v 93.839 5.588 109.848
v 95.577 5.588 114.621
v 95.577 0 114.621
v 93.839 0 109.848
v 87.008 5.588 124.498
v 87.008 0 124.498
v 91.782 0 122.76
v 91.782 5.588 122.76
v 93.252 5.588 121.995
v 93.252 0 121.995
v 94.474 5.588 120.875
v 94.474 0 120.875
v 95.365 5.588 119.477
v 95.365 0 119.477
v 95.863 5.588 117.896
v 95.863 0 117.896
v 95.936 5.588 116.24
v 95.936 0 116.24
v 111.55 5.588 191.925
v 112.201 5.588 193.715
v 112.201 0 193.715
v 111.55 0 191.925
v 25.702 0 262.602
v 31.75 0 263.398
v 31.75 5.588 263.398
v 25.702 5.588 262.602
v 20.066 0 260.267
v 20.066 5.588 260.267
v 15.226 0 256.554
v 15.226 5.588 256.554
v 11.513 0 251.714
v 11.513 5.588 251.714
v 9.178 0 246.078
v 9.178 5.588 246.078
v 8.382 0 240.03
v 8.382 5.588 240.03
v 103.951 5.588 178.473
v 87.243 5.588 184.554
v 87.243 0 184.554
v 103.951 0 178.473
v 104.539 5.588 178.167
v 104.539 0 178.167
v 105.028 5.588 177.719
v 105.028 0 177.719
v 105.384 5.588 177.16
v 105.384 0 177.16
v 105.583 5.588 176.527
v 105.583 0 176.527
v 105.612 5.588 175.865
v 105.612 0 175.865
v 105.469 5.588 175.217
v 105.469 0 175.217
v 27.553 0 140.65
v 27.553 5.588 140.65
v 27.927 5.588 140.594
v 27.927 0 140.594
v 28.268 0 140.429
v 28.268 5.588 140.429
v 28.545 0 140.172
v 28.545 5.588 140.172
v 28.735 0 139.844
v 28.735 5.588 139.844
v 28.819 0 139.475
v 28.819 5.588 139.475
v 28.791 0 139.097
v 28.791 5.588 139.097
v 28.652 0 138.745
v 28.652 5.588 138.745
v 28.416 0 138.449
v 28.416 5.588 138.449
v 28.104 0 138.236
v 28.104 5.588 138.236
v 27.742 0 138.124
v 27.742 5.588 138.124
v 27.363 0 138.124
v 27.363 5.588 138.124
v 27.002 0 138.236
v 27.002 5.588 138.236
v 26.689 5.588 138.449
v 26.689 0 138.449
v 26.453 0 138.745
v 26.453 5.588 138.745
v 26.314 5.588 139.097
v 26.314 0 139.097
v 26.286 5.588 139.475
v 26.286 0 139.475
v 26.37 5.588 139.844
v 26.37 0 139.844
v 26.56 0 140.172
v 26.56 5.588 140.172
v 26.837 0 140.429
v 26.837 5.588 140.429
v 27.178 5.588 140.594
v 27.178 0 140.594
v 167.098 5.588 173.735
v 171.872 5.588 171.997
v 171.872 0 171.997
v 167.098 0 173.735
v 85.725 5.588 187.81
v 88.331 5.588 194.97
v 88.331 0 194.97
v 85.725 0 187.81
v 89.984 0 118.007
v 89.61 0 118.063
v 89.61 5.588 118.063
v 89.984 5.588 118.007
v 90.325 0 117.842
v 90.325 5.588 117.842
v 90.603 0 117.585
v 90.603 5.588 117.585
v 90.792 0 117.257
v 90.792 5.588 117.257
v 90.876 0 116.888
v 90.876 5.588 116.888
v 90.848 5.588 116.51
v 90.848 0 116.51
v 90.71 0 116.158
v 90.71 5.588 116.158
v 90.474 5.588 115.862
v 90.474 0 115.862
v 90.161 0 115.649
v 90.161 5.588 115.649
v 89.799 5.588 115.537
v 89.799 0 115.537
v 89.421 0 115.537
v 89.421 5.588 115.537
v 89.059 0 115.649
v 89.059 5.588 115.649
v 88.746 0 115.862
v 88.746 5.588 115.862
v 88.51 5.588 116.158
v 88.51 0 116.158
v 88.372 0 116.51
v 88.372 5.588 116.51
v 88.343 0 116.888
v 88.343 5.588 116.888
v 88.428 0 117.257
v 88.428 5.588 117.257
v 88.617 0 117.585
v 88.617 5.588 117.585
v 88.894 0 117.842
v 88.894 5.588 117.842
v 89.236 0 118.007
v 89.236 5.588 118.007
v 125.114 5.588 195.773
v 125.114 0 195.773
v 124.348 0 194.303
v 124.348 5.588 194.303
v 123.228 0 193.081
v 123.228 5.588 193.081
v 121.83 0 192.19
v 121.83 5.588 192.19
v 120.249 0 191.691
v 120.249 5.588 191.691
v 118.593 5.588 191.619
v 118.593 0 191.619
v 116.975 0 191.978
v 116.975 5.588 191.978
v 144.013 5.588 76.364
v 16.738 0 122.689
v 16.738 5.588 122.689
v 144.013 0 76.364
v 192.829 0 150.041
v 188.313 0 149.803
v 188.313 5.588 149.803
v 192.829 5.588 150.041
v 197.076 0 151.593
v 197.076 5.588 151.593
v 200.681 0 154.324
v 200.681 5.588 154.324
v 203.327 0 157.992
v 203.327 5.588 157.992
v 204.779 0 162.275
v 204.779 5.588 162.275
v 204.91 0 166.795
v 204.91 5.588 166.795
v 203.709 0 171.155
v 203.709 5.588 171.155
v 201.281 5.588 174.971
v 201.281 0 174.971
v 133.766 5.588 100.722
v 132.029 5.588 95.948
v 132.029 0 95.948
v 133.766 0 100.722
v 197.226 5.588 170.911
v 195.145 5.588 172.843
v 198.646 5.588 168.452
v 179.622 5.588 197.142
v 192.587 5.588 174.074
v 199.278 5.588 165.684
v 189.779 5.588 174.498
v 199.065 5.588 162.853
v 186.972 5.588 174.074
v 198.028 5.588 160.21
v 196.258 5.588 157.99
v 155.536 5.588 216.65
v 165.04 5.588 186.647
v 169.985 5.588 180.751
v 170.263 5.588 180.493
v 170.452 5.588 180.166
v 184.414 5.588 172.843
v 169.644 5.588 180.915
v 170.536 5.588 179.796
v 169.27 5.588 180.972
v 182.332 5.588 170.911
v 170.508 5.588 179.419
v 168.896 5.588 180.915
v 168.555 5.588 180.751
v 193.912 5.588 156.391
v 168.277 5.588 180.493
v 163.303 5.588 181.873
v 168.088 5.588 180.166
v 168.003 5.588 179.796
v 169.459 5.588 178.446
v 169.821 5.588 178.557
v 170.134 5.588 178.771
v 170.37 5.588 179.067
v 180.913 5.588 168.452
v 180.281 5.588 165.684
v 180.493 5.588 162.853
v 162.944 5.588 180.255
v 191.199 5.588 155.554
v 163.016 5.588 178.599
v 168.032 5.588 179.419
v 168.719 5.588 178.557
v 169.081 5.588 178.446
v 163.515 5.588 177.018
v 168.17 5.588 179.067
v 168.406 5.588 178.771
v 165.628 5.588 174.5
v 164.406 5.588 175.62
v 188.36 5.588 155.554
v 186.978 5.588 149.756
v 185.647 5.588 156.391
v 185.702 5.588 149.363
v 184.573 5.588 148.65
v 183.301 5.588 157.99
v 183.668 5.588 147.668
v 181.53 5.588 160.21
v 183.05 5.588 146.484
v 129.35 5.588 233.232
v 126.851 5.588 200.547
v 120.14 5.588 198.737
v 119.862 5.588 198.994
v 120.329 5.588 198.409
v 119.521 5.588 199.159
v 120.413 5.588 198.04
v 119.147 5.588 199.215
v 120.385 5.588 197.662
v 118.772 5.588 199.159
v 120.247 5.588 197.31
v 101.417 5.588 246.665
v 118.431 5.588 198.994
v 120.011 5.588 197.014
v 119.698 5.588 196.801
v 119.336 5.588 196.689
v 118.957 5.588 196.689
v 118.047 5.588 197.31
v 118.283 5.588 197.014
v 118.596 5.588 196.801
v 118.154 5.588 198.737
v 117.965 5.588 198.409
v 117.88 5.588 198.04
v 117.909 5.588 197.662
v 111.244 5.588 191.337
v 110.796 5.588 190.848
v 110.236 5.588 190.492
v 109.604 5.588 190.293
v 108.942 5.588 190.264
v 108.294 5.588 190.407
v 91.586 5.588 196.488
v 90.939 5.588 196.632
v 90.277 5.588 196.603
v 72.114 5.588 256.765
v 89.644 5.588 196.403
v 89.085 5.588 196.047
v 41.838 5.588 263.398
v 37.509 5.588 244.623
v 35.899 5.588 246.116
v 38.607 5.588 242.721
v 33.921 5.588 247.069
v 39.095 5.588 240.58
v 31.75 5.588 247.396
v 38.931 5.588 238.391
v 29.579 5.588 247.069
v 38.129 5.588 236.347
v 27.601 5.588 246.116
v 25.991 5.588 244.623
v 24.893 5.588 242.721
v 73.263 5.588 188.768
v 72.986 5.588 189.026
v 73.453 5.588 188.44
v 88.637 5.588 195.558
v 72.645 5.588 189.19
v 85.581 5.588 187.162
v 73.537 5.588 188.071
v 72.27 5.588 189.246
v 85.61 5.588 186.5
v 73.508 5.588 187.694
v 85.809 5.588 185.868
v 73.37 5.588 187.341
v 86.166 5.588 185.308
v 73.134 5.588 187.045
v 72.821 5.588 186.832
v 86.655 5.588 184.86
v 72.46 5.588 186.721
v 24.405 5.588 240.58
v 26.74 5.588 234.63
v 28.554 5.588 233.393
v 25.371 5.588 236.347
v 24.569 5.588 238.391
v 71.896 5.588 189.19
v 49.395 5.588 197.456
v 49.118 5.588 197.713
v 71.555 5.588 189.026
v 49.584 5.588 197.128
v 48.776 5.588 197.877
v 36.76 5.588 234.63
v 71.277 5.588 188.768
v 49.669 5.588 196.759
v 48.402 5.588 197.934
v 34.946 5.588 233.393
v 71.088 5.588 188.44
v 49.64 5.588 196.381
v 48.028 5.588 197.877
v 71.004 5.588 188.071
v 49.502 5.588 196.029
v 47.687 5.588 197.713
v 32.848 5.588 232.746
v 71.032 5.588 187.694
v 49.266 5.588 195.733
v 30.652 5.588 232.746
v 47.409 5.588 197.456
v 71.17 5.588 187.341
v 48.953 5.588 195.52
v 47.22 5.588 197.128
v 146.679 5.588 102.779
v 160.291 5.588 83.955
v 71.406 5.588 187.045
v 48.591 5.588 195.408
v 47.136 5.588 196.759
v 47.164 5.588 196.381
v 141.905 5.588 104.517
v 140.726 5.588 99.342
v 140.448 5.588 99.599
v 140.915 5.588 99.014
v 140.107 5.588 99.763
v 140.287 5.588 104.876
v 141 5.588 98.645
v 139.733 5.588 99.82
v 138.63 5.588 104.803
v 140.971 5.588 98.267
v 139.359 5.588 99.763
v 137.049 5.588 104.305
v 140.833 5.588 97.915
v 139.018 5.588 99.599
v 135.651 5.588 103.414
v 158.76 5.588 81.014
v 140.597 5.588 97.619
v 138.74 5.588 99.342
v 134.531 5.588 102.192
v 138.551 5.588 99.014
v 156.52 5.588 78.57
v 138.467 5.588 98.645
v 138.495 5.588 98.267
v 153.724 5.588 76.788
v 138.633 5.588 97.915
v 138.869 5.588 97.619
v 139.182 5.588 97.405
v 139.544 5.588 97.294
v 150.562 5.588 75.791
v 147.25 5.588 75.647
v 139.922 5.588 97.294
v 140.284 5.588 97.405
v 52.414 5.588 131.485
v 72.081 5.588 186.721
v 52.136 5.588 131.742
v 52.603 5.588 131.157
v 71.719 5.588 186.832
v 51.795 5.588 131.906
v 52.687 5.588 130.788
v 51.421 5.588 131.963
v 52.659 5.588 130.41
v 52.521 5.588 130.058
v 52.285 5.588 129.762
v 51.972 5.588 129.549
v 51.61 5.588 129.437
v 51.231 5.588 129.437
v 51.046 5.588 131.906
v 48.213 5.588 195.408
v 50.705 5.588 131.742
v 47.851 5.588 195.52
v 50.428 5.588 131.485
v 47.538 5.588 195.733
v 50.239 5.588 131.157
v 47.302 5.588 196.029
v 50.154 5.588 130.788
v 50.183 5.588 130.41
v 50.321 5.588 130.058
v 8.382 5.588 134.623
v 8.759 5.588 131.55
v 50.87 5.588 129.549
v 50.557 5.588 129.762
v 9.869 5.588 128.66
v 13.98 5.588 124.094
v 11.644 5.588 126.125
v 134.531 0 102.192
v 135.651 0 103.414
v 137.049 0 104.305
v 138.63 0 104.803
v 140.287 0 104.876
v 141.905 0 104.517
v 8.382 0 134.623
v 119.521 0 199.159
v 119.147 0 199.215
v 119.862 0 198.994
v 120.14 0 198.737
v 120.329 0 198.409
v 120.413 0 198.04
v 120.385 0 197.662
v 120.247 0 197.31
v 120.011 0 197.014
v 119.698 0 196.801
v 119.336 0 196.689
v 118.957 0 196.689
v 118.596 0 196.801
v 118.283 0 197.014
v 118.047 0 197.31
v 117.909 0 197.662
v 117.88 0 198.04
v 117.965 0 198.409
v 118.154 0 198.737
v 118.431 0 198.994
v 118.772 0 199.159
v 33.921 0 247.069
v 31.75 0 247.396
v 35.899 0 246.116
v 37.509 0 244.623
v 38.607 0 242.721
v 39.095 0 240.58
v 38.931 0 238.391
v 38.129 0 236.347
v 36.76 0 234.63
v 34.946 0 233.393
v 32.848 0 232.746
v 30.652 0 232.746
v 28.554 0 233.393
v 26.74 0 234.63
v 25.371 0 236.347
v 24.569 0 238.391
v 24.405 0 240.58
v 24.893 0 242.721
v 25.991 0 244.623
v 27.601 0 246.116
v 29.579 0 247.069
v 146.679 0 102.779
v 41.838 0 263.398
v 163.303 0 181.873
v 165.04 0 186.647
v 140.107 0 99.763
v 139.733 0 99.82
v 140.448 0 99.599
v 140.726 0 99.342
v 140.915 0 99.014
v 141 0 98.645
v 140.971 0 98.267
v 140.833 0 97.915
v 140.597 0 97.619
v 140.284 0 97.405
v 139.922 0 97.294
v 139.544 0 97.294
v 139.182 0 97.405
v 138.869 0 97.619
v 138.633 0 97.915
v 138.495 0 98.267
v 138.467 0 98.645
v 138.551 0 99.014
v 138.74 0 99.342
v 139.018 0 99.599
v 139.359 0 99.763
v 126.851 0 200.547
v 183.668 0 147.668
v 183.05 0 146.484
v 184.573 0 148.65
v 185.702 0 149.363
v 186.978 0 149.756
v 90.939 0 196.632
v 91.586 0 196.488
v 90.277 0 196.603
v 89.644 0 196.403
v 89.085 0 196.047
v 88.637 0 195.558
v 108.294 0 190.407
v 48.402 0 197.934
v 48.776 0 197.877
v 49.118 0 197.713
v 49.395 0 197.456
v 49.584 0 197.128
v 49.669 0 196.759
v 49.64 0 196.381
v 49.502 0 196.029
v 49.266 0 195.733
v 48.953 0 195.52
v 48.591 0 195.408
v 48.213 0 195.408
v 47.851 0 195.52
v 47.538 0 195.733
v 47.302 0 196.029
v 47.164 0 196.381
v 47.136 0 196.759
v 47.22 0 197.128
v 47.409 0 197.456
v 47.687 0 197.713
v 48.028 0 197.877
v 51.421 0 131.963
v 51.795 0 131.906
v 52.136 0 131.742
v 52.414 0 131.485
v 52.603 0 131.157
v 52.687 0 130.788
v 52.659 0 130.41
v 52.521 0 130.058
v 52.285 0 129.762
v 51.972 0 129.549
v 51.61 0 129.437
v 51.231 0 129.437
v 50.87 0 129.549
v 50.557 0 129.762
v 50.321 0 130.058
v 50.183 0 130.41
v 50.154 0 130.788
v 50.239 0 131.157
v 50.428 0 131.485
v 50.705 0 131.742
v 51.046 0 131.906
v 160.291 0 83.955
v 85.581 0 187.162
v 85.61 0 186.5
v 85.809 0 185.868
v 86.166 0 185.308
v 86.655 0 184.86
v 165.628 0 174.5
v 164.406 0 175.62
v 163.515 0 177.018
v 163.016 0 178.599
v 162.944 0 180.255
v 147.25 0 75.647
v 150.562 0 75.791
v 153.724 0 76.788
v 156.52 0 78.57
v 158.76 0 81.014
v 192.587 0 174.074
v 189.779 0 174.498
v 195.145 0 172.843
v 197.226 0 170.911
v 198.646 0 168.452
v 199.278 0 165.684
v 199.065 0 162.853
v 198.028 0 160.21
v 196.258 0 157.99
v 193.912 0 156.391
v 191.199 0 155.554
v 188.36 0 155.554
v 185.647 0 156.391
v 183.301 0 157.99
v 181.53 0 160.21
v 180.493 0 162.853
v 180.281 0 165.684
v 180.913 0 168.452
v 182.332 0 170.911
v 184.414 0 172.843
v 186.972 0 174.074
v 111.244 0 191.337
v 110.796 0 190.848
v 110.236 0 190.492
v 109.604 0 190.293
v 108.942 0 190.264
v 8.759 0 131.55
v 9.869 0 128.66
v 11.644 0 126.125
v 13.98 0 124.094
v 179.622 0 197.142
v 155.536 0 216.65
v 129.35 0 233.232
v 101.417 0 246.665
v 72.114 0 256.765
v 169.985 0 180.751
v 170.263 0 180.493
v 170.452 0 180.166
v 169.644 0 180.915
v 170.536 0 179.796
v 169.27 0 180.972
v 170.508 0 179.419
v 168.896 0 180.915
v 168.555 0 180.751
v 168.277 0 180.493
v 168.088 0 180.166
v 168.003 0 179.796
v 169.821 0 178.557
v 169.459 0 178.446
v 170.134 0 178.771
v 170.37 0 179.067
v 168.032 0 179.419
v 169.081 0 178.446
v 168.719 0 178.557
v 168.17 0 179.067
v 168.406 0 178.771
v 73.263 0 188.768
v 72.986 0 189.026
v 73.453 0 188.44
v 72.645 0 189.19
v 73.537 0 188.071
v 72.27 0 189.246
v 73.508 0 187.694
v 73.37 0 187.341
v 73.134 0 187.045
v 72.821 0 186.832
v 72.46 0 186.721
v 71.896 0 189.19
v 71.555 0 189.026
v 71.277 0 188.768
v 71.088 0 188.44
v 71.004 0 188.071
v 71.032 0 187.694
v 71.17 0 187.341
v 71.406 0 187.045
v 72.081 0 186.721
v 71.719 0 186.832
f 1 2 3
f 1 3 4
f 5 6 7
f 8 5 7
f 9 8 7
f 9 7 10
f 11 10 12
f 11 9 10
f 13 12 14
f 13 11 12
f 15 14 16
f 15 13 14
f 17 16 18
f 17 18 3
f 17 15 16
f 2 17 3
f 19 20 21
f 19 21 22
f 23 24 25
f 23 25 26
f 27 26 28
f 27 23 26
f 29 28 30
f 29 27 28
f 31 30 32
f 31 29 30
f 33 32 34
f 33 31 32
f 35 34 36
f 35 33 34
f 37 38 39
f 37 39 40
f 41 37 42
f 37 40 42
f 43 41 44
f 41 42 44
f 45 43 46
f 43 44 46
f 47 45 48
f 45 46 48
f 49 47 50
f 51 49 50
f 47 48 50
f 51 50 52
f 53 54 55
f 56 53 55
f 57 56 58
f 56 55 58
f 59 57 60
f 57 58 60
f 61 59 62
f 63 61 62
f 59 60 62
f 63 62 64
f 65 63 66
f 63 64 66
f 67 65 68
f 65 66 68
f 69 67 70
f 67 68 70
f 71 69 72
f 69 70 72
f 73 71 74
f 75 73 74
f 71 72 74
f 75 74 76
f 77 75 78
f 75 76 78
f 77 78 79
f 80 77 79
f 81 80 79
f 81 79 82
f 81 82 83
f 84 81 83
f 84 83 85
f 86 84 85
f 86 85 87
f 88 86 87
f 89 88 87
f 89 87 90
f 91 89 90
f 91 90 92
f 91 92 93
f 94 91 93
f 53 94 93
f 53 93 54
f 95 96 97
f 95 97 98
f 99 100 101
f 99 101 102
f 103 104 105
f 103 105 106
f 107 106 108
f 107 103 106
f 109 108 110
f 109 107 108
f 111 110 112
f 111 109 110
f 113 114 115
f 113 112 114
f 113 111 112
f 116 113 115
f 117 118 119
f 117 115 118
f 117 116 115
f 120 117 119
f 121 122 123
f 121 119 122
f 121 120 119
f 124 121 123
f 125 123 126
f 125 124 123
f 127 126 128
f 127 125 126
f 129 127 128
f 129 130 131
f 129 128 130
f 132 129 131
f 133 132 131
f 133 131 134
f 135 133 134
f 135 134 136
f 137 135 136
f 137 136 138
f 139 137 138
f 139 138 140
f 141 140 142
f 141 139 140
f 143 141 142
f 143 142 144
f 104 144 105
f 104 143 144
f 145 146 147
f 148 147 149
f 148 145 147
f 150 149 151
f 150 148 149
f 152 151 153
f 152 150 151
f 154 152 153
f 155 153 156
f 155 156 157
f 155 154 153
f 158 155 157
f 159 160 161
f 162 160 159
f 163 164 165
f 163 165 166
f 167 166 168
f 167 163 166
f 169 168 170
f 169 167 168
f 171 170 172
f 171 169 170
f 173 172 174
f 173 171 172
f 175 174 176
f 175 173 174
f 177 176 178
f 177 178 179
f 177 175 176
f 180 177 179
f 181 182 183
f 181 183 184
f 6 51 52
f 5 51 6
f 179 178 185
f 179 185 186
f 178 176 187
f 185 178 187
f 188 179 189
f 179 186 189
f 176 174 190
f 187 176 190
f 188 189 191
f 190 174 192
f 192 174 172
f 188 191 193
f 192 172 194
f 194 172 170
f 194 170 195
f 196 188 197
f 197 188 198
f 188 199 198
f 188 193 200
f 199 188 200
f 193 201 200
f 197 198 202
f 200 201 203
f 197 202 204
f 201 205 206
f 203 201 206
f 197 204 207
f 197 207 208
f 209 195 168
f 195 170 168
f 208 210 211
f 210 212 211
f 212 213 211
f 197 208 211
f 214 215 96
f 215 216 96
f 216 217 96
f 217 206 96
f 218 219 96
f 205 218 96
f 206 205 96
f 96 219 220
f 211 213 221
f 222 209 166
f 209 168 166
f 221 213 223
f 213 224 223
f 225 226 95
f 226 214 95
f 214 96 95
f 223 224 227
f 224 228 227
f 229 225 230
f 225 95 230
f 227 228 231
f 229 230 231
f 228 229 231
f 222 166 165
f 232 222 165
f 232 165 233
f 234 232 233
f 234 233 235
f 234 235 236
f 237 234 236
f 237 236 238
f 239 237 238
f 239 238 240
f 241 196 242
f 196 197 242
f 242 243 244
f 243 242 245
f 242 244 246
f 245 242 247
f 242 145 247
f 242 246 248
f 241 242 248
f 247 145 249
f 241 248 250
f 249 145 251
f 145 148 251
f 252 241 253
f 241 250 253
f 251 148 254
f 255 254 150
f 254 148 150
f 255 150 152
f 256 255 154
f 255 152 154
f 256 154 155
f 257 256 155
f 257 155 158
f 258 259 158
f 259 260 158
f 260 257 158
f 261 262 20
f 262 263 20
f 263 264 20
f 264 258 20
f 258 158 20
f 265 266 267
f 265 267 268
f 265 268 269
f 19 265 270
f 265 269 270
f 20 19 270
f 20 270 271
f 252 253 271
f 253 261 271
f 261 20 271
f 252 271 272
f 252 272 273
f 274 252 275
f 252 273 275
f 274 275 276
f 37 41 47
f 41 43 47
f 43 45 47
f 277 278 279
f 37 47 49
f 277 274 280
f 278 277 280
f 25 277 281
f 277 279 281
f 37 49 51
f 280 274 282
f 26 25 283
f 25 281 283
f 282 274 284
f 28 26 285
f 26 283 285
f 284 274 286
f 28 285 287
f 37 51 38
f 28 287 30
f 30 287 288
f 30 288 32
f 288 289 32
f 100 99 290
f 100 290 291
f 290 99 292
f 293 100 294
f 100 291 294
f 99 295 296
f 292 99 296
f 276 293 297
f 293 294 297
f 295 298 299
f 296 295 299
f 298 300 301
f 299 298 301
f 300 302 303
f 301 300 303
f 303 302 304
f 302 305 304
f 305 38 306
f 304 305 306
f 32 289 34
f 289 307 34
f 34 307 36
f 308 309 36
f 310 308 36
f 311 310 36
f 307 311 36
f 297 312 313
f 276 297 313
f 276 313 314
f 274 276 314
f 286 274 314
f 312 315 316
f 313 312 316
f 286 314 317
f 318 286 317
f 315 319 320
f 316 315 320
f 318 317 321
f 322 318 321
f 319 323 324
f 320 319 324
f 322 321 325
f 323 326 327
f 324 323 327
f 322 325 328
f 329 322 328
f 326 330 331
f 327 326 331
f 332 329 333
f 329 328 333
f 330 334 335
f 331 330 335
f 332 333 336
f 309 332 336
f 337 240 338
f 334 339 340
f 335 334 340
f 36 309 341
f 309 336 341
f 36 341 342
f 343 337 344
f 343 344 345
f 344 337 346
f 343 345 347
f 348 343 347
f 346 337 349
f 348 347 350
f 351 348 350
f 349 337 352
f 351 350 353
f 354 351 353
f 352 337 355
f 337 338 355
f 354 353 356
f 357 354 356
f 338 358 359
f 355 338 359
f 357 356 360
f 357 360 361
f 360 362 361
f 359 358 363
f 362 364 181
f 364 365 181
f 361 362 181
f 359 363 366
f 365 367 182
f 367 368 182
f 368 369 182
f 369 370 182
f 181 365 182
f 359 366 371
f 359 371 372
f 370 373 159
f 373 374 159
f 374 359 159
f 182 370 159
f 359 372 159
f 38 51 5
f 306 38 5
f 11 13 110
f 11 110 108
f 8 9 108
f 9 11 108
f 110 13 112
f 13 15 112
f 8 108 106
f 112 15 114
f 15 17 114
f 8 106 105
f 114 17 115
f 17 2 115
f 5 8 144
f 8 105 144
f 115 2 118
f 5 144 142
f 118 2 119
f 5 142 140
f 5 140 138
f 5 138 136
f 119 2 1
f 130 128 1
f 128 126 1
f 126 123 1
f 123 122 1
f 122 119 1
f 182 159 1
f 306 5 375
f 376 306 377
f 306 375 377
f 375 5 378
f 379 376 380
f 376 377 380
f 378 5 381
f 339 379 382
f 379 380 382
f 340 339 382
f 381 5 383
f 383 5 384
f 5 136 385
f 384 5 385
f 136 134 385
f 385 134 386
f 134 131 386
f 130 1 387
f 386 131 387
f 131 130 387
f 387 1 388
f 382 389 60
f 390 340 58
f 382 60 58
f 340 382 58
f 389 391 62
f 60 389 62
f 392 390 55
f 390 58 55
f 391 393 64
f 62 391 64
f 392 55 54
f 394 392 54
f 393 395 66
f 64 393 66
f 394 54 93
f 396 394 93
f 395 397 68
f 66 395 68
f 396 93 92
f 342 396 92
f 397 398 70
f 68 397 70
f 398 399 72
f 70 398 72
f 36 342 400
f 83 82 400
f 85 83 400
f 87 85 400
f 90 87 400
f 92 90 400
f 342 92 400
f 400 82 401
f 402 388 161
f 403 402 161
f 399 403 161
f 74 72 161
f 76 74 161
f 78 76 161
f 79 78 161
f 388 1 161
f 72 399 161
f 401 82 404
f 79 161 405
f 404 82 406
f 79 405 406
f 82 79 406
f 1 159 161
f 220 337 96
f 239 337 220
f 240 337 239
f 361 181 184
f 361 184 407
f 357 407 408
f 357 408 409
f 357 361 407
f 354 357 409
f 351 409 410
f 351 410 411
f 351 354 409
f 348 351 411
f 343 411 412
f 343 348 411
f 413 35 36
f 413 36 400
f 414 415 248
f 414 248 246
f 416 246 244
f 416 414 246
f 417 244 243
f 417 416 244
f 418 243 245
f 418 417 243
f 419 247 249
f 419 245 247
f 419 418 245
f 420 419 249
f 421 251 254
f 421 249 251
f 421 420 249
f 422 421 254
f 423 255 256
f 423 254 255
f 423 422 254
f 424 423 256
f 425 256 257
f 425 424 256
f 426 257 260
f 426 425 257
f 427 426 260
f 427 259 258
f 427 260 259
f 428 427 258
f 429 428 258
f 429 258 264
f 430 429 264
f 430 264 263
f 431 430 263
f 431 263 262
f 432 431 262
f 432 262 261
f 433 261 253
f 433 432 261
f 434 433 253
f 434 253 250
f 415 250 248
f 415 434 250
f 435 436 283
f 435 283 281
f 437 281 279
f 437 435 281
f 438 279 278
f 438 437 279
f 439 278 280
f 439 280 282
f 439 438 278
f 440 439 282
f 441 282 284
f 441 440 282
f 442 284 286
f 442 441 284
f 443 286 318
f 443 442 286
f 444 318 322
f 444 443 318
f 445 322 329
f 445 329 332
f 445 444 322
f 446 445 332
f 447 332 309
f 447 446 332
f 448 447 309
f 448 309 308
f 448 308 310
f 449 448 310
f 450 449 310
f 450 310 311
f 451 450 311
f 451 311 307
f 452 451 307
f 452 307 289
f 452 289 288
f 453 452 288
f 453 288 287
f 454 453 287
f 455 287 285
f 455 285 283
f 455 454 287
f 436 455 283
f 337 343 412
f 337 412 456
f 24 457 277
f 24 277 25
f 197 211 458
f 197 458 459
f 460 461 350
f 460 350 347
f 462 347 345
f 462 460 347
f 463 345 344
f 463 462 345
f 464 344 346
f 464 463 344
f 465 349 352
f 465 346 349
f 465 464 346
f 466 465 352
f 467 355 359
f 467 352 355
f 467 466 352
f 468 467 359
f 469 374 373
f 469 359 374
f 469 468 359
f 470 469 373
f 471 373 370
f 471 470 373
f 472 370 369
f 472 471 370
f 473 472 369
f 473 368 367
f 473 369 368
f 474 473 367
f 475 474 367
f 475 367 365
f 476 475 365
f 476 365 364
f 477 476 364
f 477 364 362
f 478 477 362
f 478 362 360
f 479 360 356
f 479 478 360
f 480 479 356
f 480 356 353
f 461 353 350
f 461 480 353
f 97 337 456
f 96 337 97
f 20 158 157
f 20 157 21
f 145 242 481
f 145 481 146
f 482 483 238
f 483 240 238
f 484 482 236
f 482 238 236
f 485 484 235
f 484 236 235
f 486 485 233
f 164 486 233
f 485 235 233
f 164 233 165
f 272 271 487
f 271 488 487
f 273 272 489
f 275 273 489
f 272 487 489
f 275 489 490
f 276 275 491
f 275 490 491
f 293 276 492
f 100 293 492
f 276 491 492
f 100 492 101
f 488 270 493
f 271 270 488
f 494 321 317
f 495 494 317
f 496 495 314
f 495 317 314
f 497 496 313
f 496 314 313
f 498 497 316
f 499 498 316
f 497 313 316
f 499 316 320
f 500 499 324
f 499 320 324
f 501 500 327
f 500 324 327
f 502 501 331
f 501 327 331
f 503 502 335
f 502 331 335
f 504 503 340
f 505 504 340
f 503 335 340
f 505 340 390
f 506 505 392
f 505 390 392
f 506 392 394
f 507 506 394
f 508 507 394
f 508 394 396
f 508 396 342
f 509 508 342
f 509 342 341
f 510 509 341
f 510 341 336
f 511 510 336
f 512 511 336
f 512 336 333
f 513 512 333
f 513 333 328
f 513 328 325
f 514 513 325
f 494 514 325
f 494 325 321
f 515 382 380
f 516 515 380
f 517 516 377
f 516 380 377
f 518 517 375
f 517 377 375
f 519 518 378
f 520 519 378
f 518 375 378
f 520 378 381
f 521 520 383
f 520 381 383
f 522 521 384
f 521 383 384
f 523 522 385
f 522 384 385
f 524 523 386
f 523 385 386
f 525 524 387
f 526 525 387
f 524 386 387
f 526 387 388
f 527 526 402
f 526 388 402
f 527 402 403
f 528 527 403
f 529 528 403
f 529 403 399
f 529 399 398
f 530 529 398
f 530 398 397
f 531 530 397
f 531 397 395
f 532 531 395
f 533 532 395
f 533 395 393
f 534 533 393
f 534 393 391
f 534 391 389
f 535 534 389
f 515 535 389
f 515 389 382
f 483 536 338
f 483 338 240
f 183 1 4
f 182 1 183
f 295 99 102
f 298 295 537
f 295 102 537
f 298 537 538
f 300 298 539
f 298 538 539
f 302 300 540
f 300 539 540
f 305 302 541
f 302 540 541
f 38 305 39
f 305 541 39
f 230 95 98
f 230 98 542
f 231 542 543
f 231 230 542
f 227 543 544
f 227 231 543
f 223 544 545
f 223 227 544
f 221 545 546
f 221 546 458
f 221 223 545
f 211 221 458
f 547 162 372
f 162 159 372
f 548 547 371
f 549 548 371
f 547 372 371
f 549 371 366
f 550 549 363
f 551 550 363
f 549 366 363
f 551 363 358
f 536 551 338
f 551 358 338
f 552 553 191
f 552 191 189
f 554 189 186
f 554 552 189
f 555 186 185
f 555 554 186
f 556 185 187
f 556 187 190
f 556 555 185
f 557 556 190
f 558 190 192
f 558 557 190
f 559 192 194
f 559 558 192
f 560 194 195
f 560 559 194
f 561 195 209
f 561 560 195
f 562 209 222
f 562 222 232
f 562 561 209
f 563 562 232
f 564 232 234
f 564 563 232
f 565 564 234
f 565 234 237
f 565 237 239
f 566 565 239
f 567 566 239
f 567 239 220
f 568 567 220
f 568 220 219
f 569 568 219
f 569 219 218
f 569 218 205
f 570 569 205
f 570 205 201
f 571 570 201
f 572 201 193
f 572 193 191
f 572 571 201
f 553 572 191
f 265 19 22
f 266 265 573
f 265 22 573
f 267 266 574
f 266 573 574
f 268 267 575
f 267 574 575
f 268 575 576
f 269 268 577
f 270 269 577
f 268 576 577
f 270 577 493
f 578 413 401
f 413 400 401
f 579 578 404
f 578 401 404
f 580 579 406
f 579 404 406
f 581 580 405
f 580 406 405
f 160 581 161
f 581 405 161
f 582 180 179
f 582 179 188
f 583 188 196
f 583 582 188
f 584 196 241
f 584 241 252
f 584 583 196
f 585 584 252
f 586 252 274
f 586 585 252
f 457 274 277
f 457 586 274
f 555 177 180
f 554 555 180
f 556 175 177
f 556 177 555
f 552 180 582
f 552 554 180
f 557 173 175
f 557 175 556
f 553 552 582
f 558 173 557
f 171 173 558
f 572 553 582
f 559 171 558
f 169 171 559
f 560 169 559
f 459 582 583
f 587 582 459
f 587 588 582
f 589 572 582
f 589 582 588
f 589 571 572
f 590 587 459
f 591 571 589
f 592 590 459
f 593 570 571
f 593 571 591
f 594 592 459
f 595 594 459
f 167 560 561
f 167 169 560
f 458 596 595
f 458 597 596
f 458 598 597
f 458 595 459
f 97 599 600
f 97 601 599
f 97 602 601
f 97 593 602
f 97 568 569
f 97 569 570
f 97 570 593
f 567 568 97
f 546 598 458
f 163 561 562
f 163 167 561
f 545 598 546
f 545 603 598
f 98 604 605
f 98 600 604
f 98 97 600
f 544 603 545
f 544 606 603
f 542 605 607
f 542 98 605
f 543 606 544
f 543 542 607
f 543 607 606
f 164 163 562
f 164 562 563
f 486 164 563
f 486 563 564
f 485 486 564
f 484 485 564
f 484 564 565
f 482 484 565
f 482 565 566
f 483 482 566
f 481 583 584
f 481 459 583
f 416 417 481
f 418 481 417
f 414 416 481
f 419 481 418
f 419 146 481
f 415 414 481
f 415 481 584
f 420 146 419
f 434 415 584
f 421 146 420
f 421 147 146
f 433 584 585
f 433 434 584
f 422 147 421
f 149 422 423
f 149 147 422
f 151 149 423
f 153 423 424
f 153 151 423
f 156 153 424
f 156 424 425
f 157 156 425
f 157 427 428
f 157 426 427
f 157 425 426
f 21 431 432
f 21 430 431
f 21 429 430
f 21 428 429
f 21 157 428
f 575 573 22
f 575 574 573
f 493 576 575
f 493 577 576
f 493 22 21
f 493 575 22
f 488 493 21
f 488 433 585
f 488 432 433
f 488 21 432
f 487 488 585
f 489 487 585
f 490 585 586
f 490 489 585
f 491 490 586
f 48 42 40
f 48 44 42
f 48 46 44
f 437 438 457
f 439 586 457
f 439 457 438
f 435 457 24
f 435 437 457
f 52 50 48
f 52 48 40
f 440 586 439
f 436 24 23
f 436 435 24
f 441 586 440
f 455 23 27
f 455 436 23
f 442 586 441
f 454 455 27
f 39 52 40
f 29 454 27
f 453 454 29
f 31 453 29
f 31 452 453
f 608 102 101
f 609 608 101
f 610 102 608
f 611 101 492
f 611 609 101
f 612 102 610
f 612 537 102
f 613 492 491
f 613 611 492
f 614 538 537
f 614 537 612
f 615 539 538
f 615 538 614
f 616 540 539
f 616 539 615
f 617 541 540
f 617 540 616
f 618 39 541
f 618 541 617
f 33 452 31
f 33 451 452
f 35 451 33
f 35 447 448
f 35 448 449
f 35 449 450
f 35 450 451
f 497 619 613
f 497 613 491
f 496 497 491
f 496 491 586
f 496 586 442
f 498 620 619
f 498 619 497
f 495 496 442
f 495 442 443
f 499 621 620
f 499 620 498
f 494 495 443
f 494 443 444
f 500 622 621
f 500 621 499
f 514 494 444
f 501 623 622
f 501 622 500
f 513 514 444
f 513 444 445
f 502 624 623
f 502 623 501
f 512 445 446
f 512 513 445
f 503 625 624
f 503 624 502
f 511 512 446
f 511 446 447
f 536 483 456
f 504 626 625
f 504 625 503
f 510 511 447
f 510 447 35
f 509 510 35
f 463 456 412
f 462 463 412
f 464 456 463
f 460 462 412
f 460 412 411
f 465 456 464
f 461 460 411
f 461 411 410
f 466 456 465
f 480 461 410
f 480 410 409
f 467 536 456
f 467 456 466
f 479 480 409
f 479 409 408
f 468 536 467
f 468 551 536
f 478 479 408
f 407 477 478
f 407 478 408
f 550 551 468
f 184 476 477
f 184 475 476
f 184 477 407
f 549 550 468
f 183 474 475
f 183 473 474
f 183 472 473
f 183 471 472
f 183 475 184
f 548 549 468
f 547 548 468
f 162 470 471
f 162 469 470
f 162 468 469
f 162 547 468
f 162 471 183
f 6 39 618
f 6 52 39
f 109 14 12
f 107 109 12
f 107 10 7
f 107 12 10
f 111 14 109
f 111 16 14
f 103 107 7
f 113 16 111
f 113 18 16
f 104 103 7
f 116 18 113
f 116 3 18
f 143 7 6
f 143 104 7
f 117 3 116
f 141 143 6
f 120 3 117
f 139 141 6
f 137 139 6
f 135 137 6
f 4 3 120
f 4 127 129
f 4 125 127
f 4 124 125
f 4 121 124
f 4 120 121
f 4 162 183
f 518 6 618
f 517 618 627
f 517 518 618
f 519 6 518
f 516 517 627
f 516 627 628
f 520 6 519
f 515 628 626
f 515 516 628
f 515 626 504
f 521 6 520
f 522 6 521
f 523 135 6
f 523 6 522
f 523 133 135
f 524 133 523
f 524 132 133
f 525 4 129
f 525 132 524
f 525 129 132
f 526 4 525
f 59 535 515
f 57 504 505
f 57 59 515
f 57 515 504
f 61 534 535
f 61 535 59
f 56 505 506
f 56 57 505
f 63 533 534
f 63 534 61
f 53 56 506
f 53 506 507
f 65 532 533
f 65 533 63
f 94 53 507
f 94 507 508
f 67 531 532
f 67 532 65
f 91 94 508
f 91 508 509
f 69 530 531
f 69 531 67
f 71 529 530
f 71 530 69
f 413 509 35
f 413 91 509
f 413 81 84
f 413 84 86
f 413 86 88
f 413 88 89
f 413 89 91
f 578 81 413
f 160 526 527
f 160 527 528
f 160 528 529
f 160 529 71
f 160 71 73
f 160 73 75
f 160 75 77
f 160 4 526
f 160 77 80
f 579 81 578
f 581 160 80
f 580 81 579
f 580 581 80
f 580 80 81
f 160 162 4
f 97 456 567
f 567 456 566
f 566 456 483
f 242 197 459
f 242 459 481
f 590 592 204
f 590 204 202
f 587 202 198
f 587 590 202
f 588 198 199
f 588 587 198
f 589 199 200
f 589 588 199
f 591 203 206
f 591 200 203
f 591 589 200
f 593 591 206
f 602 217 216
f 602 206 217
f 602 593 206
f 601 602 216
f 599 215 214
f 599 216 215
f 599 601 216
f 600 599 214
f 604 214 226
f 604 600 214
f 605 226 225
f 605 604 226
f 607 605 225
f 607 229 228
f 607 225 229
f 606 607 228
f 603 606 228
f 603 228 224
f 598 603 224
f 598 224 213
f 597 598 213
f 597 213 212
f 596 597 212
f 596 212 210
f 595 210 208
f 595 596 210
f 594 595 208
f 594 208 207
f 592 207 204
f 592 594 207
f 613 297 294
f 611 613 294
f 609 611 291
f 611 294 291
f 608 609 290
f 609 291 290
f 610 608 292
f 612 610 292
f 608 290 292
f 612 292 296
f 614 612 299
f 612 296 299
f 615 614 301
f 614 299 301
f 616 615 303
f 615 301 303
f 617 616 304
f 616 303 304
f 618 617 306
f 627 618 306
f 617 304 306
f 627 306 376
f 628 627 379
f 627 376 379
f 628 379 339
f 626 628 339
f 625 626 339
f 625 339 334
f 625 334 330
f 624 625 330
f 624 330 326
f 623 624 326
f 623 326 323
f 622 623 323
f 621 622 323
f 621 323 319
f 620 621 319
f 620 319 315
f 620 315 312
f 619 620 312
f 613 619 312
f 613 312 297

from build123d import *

# Parameters (mm, degrees)
SKETCH1_R               = 7.366
SKETCH1_R_2             = 9.525
BOSS_EXTRUDE1_DEPTH     = 5.588
CUT_EXTRUDE1_DEPTH      = 334.830246753
CUT_EXTRUDE1_DEPTH_BACK = 334.830246753
SKETCH2_R               = 1.27
FILLET1_R               = 12.7
FILLET2_R               = 5.08
CUT_EXTRUDE3_DEPTH      = 334.830246753
CUT_EXTRUDE4_DEPTH      = 334.830246753
FILLET3_R               = 2.54
SKETCH6_R               = 1.27
CUT_EXTRUDE5_DEPTH      = 334.830246753


with BuildPart() as part:
    # Sketch1 → Boss-Extrude1 (new body)
    with BuildSketch(Plane(origin=(0, 0, 0), x_dir=(1, 0, 0), z_dir=(0, 1, 0))):
        with BuildLine():
            Line((8.382, -240.03), (8.382, -125.73))
            Line((8.382, -125.73), (155.947491633, -72.020553441))
            Line((155.947491633, -72.020553441), (184.566884059, -150.651687889))
            ThreePointArc((184.566884059, -150.651687889), (202.338954157, -156.340572379), (201.281045045, -174.970943032))
            ThreePointArc((201.281045045, -174.970943032), (129.350312262, -233.232473549), (41.837585925, -263.398))
            Line((41.837585925, -263.398), (31.75, -263.398))
            ThreePointArc((31.75, -263.398), (15.226328737, -256.553671263), (8.382, -240.03))
        make_face()
        with Locations(Location((31.75, -240.03, 0), (0, 0, 270))):
            Circle(SKETCH1_R, mode=Mode.SUBTRACT)
        with Locations(Location((189.779271043, -164.97260343, 0), (0, 0, 270))):
            Circle(SKETCH1_R_2, mode=Mode.SUBTRACT)
    extrude(amount=BOSS_EXTRUDE1_DEPTH)

    # Sketch2 → Cut-Extrude1 (cut, two sides: drawn at the far end of the back side and taken through both)
    with BuildSketch(Plane(origin=(0, 5.588, 0), x_dir=(1, 0, 0), z_dir=(0, 1, 0)).offset(-CUT_EXTRUDE1_DEPTH_BACK)):
        with Locations(Location((169.269931238, -179.701578394, 0), (0, 0, 270))):
            Circle(SKETCH2_R)
        with Locations(Location((119.146726846, -197.944932839, 0), (0, 0, 270))):
            Circle(SKETCH2_R)
        with Locations(Location((89.609867268, -116.793078108, 0), (0, 0, 270))):
            Circle(SKETCH2_R)
        with Locations(Location((139.733071661, -98.549723663, 0), (0, 0, 270))):
            Circle(SKETCH2_R)
    extrude(amount=CUT_EXTRUDE1_DEPTH + CUT_EXTRUDE1_DEPTH_BACK, mode=Mode.SUBTRACT)

    # Fillet1
    fillet1_edges = [part.edges().sort_by_distance(p)[0] for p in [
        (155.947491633, 2.794, 72.020553441),
        (8.382, 2.794, 125.73),
    ]]
    fillet(fillet1_edges, radius=FILLET1_R)

    # Fillet2
    fillet2_edges = [part.edges().sort_by_distance(p)[0] for p in [
        (184.566884059, 2.794, 150.651687889),
    ]]
    fillet(fillet2_edges, radius=FILLET2_R)

    # Sketch4 → Cut-Extrude3 (cut, through all)
    with BuildSketch(Plane(origin=(0, 5.588, 0), x_dir=(1, 0, 0), z_dir=(0, 1, 0))):
        with BuildLine():
            Line((95.57691541, -114.621250198), (93.839453082, -109.847611684))
            Line((93.839453082, -109.847611684), (132.028561191, -95.947913059))
            Line((132.028561191, -95.947913059), (133.766023519, -100.721551573))
            ThreePointArc((133.766023519, -100.721551573), (137.049445699, -104.304778111), (141.904899571, -104.516771805))
            Line((141.904899571, -104.516771805), (146.678538084, -102.779309477))
            Line((146.678538084, -102.779309477), (171.871741842, -171.997067924))
            Line((171.871741842, -171.997067924), (167.098103328, -173.734530252))
            ThreePointArc((167.098103328, -173.734530252), (163.514876791, -177.017952432), (163.302883096, -181.873406304))
            Line((163.302883096, -181.873406304), (165.040345424, -186.647044818))
            Line((165.040345424, -186.647044818), (126.851237316, -200.546743442))
            Line((126.851237316, -200.546743442), (125.113774988, -195.773104929))
            ThreePointArc((125.113774988, -195.773104929), (121.830352808, -192.189878391), (116.974898936, -191.977884697))
            Line((116.974898936, -191.977884697), (112.201260422, -193.715347025))
            Line((112.201260422, -193.715347025), (87.008056665, -124.497588578))
            Line((87.008056665, -124.497588578), (91.781695178, -122.76012625))
            ThreePointArc((91.781695178, -122.76012625), (95.364921716, -119.47670407), (95.57691541, -114.621250198))
        make_face()
    extrude(amount=-CUT_EXTRUDE3_DEPTH, mode=Mode.SUBTRACT)

    # Sketch5 → Cut-Extrude4 (cut, through all)
    with BuildSketch(Plane(origin=(0, 5.588, 0), x_dir=(1, 0, 0), z_dir=(0, 1, 0))):
        Polygon((110.680980885, -189.538413326), (89.199607574, -197.356993802), (84.855951753, -185.422897518), (106.337325065, -177.604317042), align=None)
    extrude(amount=-CUT_EXTRUDE4_DEPTH, mode=Mode.SUBTRACT)

    # Fillet3
    fillet3_edges = [part.edges().sort_by_distance(p)[0] for p in [
        (106.337325065, 2.794, 177.604317042),
        (110.680980885, 2.794, 189.538413326),
        (89.199607574, 2.794, 197.356993802),
        (84.855951753, 2.794, 185.422897518),
    ]]
    fillet(fillet3_edges, radius=FILLET3_R)

    # Sketch6 → Cut-Extrude5 (cut, through all)
    with BuildSketch(Plane(origin=(0, 5.588, 0), x_dir=(1, 0, 0), z_dir=(0, 1, 0))):
        with Locations(Location((51.420759159, -130.692776733, 0), (0, 0, 270))):
            Circle(SKETCH6_R)
        with Locations(Location((27.552566591, -139.380088373, 0), (0, 0, 270))):
            Circle(SKETCH6_R)
        with Locations(Location((48.402114528, -196.663750536, 0), (0, 0, 270))):
            Circle(SKETCH6_R)
        with Locations(Location((72.270307096, -187.976438896, 0), (0, 0, 270))):
            Circle(SKETCH6_R)
    extrude(amount=-CUT_EXTRUDE5_DEPTH, mode=Mode.SUBTRACT)


solid = part.part
